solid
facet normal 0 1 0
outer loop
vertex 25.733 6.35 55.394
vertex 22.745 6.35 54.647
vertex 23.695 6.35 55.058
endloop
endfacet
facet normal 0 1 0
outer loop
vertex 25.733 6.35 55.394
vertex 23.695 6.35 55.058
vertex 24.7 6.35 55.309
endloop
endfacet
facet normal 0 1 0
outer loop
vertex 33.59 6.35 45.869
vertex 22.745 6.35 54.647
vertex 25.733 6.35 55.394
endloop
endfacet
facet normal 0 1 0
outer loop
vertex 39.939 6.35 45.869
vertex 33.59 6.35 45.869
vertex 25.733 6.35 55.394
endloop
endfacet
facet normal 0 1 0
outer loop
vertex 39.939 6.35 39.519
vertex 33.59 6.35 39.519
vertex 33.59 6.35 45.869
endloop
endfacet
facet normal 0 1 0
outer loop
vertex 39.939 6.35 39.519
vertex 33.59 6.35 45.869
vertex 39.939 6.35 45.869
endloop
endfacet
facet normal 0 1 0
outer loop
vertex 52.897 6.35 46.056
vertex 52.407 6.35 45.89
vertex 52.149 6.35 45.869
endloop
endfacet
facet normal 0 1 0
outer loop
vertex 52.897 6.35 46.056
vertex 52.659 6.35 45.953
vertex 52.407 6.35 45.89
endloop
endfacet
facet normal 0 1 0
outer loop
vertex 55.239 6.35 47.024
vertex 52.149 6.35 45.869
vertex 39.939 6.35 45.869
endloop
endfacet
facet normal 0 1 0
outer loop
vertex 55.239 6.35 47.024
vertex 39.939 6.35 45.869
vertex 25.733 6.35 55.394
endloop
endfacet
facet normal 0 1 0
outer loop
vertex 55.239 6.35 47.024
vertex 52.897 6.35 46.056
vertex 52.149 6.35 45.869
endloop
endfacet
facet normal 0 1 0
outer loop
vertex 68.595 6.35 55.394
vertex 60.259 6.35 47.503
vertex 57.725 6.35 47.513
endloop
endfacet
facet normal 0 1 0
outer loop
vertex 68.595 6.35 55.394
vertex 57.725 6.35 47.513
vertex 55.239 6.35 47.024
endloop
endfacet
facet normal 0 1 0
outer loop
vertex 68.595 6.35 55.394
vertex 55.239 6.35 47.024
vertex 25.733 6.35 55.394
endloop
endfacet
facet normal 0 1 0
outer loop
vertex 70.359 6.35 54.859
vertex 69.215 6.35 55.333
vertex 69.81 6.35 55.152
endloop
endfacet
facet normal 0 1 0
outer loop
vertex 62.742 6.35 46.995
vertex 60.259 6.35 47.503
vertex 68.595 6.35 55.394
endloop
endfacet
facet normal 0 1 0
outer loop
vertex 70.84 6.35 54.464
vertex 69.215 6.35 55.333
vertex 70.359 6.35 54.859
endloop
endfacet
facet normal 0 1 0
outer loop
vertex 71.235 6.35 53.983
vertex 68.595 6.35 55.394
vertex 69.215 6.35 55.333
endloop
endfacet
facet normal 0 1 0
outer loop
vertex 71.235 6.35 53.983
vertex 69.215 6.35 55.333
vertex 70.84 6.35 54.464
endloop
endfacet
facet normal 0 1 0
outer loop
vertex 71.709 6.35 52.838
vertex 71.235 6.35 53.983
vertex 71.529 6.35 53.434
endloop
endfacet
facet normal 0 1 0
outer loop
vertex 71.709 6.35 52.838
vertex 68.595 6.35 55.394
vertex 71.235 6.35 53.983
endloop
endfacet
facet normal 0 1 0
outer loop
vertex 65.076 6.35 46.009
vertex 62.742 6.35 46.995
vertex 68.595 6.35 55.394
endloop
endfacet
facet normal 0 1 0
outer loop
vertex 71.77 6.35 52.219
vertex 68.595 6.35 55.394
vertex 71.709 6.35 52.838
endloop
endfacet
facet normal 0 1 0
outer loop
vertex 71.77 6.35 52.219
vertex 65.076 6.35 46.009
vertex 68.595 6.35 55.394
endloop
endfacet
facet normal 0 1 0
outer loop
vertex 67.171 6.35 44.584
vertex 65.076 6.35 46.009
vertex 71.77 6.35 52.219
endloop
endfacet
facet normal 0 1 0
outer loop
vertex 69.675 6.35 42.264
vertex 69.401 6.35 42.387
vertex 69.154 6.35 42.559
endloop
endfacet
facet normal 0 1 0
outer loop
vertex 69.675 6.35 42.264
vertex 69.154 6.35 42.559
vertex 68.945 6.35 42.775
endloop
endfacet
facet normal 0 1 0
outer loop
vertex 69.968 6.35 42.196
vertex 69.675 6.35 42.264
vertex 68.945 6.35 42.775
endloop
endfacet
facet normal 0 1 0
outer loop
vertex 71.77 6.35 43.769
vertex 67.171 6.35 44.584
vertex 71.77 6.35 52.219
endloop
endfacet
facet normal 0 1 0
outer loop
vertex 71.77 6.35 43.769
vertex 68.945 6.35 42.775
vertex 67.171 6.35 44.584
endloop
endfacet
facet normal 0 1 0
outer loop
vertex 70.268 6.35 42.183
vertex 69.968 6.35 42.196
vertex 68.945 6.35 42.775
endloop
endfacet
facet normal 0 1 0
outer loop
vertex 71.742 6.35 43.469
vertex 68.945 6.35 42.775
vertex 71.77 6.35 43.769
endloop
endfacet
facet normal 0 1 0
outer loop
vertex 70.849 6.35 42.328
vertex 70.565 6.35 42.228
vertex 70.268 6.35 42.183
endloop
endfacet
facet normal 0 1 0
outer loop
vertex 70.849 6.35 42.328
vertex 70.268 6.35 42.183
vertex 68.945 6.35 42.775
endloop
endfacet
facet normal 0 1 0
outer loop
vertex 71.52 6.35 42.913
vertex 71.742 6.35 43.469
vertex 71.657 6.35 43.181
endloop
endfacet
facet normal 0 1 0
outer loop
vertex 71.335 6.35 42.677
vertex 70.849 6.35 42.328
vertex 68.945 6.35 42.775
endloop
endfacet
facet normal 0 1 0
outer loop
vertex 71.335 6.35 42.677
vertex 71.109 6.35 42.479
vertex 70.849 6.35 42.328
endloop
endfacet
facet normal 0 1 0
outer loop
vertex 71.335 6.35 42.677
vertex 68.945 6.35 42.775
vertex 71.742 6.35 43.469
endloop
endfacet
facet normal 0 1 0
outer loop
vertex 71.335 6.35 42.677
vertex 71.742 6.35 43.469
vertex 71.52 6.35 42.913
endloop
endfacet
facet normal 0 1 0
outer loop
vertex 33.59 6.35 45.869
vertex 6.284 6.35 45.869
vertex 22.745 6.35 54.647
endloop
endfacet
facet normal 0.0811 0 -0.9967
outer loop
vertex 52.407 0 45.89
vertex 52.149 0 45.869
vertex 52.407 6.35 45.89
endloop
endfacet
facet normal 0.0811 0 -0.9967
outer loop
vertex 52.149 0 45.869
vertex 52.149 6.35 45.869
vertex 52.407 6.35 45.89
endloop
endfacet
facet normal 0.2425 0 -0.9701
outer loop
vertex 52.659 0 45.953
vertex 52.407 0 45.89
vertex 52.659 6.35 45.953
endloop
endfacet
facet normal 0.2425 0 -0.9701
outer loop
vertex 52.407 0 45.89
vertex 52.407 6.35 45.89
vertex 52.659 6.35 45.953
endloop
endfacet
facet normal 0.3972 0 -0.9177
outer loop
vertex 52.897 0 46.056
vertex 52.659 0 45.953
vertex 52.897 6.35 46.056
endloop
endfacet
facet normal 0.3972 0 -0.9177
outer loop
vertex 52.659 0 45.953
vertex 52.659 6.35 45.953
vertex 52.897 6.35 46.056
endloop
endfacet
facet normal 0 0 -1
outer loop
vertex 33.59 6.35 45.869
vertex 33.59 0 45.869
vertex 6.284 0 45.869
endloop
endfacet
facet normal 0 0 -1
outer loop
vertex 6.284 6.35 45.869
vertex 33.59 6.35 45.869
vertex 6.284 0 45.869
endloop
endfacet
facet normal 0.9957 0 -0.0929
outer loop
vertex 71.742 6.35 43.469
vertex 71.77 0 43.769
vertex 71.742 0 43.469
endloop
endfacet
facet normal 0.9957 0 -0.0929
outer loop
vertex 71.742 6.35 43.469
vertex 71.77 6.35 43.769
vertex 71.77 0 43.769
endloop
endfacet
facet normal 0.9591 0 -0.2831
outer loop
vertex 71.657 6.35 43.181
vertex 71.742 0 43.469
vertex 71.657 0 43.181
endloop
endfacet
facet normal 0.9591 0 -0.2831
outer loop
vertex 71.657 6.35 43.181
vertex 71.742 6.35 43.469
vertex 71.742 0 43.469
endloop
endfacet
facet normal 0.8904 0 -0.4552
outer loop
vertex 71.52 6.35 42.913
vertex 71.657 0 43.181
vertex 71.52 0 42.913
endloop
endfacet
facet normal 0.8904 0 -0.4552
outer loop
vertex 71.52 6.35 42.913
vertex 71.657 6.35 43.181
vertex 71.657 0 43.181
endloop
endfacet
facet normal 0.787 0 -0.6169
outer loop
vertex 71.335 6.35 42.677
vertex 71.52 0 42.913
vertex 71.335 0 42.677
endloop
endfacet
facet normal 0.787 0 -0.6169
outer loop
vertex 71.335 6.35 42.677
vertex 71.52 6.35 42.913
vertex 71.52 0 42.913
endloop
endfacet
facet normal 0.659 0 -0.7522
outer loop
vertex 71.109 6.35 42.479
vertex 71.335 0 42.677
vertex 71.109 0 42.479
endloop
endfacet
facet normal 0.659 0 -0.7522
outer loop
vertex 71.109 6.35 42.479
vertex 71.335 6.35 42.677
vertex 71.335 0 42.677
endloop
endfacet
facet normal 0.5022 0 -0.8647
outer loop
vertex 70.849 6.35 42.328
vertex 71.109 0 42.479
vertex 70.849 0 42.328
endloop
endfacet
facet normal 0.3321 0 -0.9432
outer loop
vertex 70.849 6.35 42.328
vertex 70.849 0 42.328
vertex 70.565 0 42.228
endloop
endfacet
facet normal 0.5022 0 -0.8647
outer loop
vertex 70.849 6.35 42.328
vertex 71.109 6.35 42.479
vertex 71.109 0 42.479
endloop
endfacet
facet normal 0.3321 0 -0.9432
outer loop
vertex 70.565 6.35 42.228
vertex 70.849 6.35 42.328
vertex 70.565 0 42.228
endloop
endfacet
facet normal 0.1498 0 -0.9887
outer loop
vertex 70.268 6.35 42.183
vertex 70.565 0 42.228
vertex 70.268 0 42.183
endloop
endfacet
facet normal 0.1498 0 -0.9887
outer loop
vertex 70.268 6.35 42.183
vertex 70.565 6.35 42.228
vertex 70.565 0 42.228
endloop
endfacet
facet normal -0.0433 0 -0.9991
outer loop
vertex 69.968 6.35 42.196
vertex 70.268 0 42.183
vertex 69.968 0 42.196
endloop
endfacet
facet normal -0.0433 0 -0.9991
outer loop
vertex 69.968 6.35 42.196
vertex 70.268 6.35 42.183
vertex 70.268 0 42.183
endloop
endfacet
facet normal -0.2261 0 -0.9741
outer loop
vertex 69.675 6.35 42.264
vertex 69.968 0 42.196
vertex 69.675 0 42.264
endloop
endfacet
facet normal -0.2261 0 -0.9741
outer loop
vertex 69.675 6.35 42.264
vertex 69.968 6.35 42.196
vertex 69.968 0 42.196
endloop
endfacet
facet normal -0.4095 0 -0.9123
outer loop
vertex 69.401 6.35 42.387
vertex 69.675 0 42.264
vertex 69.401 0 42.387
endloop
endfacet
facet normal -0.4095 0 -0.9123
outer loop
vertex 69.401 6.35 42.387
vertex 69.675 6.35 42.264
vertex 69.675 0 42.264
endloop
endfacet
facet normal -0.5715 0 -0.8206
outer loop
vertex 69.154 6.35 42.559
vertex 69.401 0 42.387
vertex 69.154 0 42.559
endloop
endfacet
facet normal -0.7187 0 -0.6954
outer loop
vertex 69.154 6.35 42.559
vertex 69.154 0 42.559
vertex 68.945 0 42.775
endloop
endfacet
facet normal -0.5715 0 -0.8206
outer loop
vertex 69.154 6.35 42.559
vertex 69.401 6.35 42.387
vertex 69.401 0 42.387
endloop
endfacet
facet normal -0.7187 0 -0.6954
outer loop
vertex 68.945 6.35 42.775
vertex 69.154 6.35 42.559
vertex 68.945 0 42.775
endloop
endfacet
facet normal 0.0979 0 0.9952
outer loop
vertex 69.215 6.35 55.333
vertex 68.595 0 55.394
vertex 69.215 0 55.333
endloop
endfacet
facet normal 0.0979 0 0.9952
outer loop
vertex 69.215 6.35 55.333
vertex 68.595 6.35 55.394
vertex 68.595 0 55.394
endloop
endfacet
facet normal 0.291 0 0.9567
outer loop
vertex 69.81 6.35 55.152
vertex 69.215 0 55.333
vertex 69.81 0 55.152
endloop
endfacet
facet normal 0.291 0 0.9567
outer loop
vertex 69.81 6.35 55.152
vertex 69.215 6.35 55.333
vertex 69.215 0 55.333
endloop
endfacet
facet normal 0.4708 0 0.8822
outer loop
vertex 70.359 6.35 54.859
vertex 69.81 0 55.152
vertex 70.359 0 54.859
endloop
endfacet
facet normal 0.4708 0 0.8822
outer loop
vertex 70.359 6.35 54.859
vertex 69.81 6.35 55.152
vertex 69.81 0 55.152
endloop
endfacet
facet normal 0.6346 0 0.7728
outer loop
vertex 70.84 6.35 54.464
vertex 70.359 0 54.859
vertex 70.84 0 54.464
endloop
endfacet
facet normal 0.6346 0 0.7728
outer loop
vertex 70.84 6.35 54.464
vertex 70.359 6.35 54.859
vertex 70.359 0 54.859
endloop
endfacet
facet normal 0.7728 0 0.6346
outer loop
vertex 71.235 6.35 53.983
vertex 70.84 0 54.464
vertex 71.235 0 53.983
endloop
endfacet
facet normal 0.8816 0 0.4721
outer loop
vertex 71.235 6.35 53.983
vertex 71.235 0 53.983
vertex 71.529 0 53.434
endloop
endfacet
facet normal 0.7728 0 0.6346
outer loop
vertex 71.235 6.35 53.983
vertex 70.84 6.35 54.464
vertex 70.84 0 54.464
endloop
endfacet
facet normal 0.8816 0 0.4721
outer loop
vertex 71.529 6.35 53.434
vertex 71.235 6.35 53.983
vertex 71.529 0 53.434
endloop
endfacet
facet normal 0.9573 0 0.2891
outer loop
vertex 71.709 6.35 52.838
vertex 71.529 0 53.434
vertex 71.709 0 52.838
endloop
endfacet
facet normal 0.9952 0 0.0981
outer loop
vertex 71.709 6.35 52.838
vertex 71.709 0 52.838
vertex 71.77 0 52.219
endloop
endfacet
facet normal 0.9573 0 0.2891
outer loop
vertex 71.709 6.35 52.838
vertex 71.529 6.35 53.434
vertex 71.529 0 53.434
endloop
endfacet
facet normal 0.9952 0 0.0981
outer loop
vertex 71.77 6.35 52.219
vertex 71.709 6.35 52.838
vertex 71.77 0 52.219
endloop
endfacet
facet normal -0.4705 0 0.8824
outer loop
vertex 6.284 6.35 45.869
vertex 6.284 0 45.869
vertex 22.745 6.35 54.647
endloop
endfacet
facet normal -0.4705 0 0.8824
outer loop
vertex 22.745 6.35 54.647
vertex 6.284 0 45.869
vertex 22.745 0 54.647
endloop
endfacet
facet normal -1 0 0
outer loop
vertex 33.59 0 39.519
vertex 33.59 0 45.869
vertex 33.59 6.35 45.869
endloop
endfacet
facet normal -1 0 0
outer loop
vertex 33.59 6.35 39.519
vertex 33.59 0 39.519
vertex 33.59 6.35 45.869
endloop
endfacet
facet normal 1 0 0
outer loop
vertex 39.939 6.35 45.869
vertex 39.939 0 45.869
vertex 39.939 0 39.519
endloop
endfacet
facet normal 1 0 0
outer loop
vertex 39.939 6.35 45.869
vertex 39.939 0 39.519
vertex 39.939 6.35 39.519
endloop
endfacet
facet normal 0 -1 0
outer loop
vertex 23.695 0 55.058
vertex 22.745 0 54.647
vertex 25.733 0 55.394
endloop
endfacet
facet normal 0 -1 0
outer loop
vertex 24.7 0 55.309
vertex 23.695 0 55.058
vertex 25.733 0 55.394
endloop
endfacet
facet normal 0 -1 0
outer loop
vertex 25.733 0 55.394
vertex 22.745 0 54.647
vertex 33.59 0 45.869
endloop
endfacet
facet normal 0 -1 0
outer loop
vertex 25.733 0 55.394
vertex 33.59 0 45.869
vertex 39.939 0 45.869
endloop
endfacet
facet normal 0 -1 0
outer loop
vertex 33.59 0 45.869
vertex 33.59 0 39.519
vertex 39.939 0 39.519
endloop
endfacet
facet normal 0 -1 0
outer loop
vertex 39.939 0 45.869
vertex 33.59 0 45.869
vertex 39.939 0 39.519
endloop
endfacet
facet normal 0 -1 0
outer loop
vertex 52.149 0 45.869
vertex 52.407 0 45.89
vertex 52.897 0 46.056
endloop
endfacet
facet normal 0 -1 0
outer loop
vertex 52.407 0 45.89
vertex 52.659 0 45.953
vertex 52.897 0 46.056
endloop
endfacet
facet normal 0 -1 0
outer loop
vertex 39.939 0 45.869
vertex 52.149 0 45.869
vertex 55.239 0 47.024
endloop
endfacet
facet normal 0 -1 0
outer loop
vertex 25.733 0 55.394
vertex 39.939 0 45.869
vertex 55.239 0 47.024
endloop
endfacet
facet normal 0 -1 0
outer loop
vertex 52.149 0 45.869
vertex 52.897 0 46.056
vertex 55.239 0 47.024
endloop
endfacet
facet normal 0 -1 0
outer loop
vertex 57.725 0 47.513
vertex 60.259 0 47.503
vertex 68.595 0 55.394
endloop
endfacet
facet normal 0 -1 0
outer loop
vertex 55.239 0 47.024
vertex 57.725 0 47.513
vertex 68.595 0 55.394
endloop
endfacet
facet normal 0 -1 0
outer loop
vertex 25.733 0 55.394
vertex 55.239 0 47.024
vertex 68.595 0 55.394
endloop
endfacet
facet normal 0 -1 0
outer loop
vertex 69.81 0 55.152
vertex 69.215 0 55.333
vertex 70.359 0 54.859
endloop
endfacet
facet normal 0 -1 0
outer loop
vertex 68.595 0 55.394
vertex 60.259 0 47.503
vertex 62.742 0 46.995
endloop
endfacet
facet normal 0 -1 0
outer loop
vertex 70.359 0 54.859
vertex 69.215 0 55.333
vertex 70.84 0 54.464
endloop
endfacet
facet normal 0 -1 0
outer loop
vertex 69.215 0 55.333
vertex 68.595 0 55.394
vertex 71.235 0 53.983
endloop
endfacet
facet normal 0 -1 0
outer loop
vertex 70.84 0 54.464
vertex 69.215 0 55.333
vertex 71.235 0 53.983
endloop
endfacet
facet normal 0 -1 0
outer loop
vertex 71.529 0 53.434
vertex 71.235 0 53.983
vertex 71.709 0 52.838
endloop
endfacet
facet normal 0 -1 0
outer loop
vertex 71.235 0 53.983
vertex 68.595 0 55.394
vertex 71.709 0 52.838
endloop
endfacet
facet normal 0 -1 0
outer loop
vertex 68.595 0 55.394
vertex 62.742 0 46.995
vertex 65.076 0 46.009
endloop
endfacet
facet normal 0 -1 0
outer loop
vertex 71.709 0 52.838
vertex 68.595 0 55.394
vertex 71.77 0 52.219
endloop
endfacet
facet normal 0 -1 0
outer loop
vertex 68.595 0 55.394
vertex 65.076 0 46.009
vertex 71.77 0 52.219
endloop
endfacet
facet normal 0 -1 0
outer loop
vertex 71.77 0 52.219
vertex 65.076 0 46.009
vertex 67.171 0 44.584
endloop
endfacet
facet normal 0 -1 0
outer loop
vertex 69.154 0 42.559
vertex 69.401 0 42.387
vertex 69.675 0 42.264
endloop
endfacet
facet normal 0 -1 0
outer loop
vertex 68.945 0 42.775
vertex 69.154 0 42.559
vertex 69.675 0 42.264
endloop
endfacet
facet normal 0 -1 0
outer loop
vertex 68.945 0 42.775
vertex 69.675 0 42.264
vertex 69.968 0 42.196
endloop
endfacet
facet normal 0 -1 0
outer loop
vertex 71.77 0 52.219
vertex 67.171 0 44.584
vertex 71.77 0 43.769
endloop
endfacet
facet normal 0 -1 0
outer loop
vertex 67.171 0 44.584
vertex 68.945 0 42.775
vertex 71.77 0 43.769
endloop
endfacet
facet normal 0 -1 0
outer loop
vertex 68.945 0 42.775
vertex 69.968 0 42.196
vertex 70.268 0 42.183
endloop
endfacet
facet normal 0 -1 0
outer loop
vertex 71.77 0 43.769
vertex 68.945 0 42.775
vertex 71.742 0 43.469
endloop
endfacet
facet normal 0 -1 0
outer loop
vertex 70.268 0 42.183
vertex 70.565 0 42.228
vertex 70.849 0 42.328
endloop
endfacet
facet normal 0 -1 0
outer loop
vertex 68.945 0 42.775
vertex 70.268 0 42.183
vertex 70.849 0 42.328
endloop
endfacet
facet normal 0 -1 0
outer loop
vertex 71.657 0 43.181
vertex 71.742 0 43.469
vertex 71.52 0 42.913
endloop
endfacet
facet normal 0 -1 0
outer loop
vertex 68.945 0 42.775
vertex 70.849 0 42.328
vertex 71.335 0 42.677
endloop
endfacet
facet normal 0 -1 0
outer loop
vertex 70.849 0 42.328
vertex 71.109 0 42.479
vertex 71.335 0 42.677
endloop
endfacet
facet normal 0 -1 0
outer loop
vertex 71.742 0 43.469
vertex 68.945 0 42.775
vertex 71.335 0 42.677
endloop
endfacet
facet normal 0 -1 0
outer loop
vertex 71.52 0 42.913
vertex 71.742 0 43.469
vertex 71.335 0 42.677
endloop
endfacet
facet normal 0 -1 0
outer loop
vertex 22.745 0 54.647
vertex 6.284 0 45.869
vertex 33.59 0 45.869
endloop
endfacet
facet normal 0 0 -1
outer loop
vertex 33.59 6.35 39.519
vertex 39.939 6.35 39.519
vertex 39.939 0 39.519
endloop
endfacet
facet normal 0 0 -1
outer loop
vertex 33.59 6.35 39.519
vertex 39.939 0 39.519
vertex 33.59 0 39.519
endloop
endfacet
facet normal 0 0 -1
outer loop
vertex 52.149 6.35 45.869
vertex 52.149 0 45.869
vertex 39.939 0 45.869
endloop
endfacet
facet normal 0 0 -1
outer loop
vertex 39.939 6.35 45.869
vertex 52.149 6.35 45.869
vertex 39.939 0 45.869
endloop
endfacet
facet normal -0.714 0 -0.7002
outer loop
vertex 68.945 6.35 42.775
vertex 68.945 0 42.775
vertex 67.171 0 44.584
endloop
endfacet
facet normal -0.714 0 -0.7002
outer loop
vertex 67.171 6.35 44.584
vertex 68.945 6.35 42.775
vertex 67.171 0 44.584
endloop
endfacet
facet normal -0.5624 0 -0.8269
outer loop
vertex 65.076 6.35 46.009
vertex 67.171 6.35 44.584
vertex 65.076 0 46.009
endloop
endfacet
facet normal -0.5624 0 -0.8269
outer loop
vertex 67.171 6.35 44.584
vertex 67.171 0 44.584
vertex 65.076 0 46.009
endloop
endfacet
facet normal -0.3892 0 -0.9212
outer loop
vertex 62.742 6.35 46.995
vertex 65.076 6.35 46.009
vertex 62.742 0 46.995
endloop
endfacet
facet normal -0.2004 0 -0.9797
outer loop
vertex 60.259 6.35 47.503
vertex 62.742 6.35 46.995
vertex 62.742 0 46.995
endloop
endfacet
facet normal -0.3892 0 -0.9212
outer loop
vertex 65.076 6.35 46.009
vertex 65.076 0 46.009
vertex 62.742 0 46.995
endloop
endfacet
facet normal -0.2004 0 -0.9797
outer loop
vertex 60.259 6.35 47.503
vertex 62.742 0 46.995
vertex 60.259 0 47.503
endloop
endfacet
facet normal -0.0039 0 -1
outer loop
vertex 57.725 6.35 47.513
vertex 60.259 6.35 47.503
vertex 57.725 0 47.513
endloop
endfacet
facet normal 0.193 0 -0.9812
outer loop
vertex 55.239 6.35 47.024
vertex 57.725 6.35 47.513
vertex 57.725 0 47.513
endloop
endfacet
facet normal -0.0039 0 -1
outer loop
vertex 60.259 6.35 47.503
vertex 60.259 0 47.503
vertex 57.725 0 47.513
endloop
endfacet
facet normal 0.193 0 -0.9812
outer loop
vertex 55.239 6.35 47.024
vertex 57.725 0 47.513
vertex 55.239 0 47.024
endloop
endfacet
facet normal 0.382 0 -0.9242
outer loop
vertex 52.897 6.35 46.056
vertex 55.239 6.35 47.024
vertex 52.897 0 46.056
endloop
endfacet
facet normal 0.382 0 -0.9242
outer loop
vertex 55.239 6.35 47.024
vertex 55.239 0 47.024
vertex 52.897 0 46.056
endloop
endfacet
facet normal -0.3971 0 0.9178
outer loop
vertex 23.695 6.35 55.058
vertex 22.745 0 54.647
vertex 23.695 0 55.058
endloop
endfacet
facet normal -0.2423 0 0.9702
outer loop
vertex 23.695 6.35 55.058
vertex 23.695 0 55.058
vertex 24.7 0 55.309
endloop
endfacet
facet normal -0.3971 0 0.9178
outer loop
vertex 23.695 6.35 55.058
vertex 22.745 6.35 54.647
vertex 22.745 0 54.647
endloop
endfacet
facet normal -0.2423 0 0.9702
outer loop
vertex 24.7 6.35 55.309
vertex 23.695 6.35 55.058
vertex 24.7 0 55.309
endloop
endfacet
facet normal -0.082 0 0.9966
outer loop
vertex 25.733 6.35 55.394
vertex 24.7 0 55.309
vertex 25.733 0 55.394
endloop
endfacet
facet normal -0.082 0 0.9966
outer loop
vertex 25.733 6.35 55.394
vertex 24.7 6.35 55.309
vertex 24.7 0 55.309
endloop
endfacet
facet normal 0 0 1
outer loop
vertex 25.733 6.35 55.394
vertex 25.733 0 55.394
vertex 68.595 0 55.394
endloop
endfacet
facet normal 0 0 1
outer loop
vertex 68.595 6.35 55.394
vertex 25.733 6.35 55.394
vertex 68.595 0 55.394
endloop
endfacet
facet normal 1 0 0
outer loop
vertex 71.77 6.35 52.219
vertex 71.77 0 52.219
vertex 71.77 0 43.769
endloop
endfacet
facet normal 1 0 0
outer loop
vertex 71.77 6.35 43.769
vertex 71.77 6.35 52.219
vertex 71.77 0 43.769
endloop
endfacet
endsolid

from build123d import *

# Parameters (mm, degrees)
BOSS_EXTRUDE1_DEPTH = 6.35
FILLET1_R           = 1.5875
FILLET2_R           = 6.35
FILLET3_R           = 3.175
SKETCH2_W           = 6.35
SKETCH2_H           = 6.35
BOSS_EXTRUDE2_DEPTH = 6.35


with BuildPart() as part:
    # Sketch1 → Boss-Extrude1 (new body)
    with BuildSketch(Plane(origin=(0, 0, 0), x_dir=(1, 0, 0), z_dir=(0, 1, 0))):
        with BuildLine():
            Line((52.558738922, -45.868730992), (33.5895, -45.868730992))
            Line((33.5895, -45.868730992), (6.2845, -45.868730992))
            Line((6.2845, -45.868730992), (24.145239996, -55.393730992))
            Line((24.145239996, -55.393730992), (71.770239996, -55.393730992))
            Line((71.770239996, -55.393730992), (71.770239996, -34.743530992))
            ThreePointArc((71.770239996, -34.743530992), (65.371223106, -45.84366442), (52.558738922, -45.868730992))
        make_face()
    extrude(amount=BOSS_EXTRUDE1_DEPTH)

    # Fillet1
    fillet1_edges = [part.edges().sort_by_distance(p)[0] for p in [
        (71.770239996, 3.175, 34.743530992),
        (52.558738922, 3.175, 45.868730992),
    ]]
    fillet(fillet1_edges, radius=FILLET1_R)

    # Fillet2
    fillet2_edges = [part.edges().sort_by_distance(p)[0] for p in [
        (24.145239996, 3.175, 55.393730992),
    ]]
    fillet(fillet2_edges, radius=FILLET2_R)

    # Fillet3
    fillet3_edges = [part.edges().sort_by_distance(p)[0] for p in [
        (71.770239996, 3.175, 55.393730992),
    ]]
    fillet(fillet3_edges, radius=FILLET3_R)

    # Sketch2 → Boss-Extrude2 (add)
    with BuildSketch(Plane(origin=(0, 0, 45.868730992), x_dir=(-1, 0, 0), z_dir=(0, 0, -1))):
        with Locations((-36.7645, 3.175)):
            Rectangle(SKETCH2_W, SKETCH2_H)
    extrude(amount=BOSS_EXTRUDE2_DEPTH)


solid = part.part
